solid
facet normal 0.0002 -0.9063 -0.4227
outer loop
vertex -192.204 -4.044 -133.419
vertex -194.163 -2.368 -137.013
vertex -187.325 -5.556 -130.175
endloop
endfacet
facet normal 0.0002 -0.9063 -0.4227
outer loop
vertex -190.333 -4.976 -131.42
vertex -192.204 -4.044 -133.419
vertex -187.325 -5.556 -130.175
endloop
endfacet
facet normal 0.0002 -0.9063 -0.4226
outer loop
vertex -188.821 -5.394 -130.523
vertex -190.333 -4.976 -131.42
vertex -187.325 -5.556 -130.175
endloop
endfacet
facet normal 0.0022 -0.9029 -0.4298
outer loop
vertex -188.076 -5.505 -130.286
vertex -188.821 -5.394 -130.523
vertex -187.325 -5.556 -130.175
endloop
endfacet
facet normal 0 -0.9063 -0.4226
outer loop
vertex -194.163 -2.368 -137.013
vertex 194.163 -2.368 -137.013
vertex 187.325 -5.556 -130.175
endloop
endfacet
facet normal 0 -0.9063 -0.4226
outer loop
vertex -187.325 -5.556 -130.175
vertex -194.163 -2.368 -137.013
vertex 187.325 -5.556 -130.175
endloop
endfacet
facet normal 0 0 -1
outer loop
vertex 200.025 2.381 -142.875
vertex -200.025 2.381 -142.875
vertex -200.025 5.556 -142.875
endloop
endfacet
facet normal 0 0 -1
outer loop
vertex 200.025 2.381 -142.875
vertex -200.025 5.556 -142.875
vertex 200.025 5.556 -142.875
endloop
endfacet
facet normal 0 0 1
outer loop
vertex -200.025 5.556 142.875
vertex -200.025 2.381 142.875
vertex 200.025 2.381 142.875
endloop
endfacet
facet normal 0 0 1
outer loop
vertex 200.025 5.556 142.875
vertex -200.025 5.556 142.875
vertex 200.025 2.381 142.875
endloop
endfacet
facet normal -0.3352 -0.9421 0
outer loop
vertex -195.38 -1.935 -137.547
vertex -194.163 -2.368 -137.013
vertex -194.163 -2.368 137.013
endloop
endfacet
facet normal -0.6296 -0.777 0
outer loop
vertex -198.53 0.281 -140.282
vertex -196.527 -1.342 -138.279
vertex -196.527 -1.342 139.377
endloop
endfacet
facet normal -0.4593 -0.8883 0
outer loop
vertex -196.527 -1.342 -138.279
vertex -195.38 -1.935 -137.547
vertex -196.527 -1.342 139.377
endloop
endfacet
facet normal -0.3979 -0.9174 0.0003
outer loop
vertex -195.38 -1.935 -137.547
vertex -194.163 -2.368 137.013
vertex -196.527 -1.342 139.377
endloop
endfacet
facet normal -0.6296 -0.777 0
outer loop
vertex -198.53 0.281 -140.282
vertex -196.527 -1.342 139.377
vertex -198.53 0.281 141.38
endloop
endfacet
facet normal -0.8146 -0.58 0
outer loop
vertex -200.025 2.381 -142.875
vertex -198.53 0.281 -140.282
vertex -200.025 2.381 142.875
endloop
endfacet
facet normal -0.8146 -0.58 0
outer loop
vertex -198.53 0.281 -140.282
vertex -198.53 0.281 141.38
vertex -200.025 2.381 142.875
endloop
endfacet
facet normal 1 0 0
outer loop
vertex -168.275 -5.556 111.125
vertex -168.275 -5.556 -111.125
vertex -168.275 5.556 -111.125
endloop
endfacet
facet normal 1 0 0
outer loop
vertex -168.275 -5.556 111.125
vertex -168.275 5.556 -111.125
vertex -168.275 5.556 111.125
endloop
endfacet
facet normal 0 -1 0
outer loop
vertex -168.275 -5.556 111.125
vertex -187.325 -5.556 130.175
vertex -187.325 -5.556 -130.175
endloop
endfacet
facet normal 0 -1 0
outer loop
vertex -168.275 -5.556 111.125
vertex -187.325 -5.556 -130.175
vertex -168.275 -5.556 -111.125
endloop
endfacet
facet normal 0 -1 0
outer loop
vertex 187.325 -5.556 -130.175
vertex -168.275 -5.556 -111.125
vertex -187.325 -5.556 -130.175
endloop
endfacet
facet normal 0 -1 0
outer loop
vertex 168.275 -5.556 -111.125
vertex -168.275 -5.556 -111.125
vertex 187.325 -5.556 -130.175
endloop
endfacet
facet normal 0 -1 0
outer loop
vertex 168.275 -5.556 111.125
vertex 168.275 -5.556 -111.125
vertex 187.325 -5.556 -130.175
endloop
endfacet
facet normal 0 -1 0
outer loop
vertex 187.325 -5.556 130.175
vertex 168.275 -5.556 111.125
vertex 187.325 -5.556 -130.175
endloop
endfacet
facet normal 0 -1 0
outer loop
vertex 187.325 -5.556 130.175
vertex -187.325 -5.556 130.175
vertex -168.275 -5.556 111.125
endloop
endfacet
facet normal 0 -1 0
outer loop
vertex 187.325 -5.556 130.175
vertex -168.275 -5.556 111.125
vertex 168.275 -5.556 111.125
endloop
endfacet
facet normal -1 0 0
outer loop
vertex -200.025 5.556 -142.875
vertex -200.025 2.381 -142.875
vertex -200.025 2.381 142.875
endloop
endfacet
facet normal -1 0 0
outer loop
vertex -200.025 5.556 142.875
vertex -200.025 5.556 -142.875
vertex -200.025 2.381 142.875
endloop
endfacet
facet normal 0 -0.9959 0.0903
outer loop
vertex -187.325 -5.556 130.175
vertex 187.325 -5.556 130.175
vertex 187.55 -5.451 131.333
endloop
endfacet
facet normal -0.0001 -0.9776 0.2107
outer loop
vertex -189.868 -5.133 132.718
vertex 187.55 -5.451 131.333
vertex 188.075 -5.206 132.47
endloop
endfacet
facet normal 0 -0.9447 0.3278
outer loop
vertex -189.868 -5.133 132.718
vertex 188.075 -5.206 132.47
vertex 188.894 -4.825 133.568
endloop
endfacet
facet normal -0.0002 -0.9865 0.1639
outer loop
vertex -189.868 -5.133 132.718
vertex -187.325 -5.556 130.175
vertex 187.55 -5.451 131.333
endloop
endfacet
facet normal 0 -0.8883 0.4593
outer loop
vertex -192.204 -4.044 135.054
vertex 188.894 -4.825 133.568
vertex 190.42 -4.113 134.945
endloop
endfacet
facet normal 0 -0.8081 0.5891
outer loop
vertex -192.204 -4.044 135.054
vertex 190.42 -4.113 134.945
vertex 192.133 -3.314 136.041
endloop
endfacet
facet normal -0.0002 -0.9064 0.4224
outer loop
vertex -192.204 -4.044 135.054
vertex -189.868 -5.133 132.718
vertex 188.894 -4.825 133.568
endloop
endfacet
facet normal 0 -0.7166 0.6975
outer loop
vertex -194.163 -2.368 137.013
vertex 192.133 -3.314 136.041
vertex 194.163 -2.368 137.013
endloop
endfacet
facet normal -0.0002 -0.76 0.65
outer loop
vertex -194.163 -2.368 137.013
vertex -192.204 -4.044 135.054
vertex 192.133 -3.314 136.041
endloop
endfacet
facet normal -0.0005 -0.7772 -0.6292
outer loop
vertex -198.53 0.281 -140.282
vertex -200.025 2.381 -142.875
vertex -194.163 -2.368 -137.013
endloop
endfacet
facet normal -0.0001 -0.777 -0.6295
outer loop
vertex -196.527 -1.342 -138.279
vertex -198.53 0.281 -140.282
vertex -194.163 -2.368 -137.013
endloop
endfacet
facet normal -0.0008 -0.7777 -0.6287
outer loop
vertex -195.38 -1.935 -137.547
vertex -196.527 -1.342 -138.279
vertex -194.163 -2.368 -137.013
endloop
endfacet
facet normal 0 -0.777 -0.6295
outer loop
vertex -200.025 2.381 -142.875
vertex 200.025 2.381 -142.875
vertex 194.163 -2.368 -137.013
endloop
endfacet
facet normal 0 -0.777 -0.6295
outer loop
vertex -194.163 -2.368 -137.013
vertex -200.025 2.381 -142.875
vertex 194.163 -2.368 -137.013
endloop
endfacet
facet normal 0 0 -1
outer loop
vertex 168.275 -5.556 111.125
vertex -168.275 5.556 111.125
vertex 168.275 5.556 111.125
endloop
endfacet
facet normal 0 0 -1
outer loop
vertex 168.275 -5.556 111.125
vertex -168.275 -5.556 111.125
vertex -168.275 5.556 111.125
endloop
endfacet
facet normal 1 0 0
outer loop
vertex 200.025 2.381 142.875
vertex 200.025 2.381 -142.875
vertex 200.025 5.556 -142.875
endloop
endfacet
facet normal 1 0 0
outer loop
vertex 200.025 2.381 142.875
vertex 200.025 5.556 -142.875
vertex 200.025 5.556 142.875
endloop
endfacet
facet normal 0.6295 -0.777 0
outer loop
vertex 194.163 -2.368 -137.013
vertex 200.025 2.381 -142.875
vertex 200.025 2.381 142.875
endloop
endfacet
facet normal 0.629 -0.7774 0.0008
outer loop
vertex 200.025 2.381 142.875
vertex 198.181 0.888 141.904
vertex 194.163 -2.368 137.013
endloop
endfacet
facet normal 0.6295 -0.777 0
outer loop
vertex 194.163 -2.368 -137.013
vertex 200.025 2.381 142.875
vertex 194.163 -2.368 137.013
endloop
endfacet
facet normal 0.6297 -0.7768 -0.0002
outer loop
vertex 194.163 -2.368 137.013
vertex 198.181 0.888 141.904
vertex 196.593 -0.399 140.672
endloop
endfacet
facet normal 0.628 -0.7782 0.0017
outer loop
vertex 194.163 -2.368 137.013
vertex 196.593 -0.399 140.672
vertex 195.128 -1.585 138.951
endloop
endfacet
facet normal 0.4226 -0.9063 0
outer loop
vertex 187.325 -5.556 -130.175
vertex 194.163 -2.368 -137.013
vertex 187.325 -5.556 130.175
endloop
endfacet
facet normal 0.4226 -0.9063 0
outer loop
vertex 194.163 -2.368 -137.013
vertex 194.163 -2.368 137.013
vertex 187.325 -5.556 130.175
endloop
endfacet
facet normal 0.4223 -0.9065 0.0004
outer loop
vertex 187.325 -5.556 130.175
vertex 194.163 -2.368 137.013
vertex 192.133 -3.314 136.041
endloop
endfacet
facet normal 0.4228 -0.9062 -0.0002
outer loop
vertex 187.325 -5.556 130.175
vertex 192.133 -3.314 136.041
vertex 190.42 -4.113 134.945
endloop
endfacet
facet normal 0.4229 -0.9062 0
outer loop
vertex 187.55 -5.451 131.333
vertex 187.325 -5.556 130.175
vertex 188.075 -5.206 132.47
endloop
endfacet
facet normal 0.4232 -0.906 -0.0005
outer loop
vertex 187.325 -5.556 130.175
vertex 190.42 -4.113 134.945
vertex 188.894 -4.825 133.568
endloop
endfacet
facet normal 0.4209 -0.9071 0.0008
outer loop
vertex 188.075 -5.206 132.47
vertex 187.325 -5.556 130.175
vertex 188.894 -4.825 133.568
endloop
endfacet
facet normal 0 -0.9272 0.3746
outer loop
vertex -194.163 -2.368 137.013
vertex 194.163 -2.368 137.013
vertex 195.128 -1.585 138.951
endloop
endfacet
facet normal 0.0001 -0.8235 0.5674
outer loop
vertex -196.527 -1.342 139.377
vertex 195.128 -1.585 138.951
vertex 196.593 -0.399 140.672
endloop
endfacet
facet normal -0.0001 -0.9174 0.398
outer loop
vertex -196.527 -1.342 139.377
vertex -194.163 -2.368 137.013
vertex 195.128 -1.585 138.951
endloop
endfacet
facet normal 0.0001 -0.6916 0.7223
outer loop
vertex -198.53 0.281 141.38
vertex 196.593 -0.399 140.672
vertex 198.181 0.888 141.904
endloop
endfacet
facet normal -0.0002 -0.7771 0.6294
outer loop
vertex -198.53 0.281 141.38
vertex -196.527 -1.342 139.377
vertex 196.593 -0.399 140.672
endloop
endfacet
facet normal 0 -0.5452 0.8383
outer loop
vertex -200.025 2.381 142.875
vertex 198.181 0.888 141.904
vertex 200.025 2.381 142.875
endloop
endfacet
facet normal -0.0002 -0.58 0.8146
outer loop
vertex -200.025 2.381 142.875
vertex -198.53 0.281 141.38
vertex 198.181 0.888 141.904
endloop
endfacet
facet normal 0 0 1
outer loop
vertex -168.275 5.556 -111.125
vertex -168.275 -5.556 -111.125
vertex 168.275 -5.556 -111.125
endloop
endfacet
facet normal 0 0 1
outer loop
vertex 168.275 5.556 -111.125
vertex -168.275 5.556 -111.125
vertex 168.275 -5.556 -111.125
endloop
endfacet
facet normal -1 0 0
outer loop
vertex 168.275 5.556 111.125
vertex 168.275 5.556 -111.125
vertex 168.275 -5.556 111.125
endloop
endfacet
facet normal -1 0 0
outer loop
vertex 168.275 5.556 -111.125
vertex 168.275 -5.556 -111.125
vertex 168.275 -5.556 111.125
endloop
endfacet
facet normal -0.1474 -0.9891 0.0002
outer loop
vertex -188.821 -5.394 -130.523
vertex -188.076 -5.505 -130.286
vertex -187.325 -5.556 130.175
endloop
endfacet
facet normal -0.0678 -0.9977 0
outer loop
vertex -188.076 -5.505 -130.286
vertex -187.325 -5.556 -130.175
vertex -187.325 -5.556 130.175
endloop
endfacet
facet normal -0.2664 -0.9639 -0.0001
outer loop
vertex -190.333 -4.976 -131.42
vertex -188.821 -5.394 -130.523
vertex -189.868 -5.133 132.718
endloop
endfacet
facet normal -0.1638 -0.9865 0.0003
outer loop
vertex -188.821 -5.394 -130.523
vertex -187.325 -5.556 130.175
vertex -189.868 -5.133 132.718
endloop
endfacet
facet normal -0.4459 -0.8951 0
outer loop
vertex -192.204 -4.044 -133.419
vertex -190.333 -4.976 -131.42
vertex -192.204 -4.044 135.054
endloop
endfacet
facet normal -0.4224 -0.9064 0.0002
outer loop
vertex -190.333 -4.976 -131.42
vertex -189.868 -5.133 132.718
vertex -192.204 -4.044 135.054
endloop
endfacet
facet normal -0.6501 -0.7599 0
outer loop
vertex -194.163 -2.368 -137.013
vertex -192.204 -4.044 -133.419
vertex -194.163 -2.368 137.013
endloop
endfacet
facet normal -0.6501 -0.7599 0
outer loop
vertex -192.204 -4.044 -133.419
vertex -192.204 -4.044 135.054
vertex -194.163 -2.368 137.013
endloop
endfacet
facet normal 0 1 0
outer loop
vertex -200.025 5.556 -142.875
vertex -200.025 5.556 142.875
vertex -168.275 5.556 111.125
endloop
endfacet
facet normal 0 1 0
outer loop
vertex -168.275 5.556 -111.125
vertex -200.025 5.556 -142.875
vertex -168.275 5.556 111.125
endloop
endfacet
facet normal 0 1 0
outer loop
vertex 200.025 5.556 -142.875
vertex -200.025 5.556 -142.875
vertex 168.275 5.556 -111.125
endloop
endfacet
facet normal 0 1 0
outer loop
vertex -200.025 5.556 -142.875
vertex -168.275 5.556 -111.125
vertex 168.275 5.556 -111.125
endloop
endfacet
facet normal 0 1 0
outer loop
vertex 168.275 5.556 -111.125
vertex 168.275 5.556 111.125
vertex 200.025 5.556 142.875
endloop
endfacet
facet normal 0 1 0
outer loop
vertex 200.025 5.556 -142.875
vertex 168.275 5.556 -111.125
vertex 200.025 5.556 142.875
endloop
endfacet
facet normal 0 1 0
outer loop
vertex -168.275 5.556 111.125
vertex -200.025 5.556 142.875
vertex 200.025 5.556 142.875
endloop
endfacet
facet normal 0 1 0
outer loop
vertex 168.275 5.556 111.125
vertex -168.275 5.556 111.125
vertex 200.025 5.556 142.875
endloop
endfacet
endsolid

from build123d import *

# Parameters (mm, degrees)
F0_W          = 400.05
F0_H          = 285.75
F0_W_2        = 336.55
F0_H_2        = 222.25
F1_DEPTH      = 5.55625
F3_DEPTH      = 142.876
F3_DEPTH_BACK = 142.876
F5_DEPTH      = 200.026
F5_DEPTH_BACK = 200.026


with BuildPart() as f1:
    # F0 (on Front) → F1 (new body, symmetric)
    with BuildSketch(Plane.XZ):
        Rectangle(F0_W, F0_H)
        Rectangle(F0_W_2, F0_H_2, mode=Mode.SUBTRACT)
    extrude(amount=F1_DEPTH, both=True)

    # F2 (on Top) → F3 (cut, two sides)
    with BuildSketch(Plane.XY) as f3_sk:
        with BuildLine():
            ThreePointArc((-187.325, -5.55625), (-191.0729853256, -4.6678735007), (-194.1626797348, -2.3677875757))
            ThreePointArc((-194.1626797348, -2.3677875757), (-197.5840837344, -0.5984369952), (-200.025, 2.38125))
            Line((-200.025, 2.38125), (-200.025, -5.55625))
            Line((-200.025, -5.55625), (-187.325, -5.55625))
        make_face()
        with BuildLine():
            Line((194.1626797348, -2.3677875757), (187.325, -5.55625))
            ThreePointArc((187.325, -5.55625), (191.0729853256, -4.6678735007), (194.1626797348, -2.3677875757))
        make_face()
        with BuildLine():
            ThreePointArc((194.1626797348, -2.3677875757), (191.0729853256, -4.6678735007), (187.325, -5.55625))
            Line((187.325, -5.55625), (200.025, -5.55625))
            Line((200.025, -5.55625), (200.025, 2.38125))
            ThreePointArc((200.025, 2.38125), (197.5840837344, -0.5984369952), (194.1626797348, -2.3677875757))
        make_face()
        with BuildLine():
            Line((200.025, 2.38125), (194.1626797348, -2.3677875757))
            ThreePointArc((194.1626797348, -2.3677875757), (197.5840837344, -0.5984369952), (200.025, 2.38125))
        make_face()
    extrude(amount=-F3_DEPTH, mode=Mode.SUBTRACT)
    extrude(f3_sk.sketch, amount=F3_DEPTH_BACK, mode=Mode.SUBTRACT)

    # F4 (on Right) → F5 (cut, two sides)
    with BuildSketch(Plane.YZ) as f5_sk:
        with BuildLine():
            Line((-5.55625, 142.875), (-5.55625, 130.175))
            ThreePointArc((-5.55625, 130.175), (-4.6678735007, 133.9229853256), (-2.3677875757, 137.0126797348))
            ThreePointArc((-2.3677875757, 137.0126797348), (-0.5984369952, 140.4340837344), (2.38125, 142.875))
            Line((2.38125, 142.875), (-5.55625, 142.875))
        make_face()
        with BuildLine():
            ThreePointArc((-2.3677875757, -137.0126797348), (-4.6678735007, -133.9229853256), (-5.55625, -130.175))
            Line((-5.55625, -130.175), (-5.55625, -142.875))
            Line((-5.55625, -142.875), (2.38125, -142.875))
            ThreePointArc((2.38125, -142.875), (-0.5984369952, -140.4340837344), (-2.3677875757, -137.0126797348))
        make_face()
        with BuildLine():
            Line((-2.3677875757, -137.0126797348), (-5.55625, -130.175))
            ThreePointArc((-5.55625, -130.175), (-4.6678735007, -133.9229853256), (-2.3677875757, -137.0126797348))
        make_face()
        with BuildLine():
            Line((2.38125, -142.875), (-2.3677875757, -137.0126797348))
            ThreePointArc((-2.3677875757, -137.0126797348), (-0.5984369952, -140.4340837344), (2.38125, -142.875))
        make_face()
    extrude(amount=-F5_DEPTH, mode=Mode.SUBTRACT)
    extrude(f5_sk.sketch, amount=F5_DEPTH_BACK, mode=Mode.SUBTRACT)


solid = f1.part
